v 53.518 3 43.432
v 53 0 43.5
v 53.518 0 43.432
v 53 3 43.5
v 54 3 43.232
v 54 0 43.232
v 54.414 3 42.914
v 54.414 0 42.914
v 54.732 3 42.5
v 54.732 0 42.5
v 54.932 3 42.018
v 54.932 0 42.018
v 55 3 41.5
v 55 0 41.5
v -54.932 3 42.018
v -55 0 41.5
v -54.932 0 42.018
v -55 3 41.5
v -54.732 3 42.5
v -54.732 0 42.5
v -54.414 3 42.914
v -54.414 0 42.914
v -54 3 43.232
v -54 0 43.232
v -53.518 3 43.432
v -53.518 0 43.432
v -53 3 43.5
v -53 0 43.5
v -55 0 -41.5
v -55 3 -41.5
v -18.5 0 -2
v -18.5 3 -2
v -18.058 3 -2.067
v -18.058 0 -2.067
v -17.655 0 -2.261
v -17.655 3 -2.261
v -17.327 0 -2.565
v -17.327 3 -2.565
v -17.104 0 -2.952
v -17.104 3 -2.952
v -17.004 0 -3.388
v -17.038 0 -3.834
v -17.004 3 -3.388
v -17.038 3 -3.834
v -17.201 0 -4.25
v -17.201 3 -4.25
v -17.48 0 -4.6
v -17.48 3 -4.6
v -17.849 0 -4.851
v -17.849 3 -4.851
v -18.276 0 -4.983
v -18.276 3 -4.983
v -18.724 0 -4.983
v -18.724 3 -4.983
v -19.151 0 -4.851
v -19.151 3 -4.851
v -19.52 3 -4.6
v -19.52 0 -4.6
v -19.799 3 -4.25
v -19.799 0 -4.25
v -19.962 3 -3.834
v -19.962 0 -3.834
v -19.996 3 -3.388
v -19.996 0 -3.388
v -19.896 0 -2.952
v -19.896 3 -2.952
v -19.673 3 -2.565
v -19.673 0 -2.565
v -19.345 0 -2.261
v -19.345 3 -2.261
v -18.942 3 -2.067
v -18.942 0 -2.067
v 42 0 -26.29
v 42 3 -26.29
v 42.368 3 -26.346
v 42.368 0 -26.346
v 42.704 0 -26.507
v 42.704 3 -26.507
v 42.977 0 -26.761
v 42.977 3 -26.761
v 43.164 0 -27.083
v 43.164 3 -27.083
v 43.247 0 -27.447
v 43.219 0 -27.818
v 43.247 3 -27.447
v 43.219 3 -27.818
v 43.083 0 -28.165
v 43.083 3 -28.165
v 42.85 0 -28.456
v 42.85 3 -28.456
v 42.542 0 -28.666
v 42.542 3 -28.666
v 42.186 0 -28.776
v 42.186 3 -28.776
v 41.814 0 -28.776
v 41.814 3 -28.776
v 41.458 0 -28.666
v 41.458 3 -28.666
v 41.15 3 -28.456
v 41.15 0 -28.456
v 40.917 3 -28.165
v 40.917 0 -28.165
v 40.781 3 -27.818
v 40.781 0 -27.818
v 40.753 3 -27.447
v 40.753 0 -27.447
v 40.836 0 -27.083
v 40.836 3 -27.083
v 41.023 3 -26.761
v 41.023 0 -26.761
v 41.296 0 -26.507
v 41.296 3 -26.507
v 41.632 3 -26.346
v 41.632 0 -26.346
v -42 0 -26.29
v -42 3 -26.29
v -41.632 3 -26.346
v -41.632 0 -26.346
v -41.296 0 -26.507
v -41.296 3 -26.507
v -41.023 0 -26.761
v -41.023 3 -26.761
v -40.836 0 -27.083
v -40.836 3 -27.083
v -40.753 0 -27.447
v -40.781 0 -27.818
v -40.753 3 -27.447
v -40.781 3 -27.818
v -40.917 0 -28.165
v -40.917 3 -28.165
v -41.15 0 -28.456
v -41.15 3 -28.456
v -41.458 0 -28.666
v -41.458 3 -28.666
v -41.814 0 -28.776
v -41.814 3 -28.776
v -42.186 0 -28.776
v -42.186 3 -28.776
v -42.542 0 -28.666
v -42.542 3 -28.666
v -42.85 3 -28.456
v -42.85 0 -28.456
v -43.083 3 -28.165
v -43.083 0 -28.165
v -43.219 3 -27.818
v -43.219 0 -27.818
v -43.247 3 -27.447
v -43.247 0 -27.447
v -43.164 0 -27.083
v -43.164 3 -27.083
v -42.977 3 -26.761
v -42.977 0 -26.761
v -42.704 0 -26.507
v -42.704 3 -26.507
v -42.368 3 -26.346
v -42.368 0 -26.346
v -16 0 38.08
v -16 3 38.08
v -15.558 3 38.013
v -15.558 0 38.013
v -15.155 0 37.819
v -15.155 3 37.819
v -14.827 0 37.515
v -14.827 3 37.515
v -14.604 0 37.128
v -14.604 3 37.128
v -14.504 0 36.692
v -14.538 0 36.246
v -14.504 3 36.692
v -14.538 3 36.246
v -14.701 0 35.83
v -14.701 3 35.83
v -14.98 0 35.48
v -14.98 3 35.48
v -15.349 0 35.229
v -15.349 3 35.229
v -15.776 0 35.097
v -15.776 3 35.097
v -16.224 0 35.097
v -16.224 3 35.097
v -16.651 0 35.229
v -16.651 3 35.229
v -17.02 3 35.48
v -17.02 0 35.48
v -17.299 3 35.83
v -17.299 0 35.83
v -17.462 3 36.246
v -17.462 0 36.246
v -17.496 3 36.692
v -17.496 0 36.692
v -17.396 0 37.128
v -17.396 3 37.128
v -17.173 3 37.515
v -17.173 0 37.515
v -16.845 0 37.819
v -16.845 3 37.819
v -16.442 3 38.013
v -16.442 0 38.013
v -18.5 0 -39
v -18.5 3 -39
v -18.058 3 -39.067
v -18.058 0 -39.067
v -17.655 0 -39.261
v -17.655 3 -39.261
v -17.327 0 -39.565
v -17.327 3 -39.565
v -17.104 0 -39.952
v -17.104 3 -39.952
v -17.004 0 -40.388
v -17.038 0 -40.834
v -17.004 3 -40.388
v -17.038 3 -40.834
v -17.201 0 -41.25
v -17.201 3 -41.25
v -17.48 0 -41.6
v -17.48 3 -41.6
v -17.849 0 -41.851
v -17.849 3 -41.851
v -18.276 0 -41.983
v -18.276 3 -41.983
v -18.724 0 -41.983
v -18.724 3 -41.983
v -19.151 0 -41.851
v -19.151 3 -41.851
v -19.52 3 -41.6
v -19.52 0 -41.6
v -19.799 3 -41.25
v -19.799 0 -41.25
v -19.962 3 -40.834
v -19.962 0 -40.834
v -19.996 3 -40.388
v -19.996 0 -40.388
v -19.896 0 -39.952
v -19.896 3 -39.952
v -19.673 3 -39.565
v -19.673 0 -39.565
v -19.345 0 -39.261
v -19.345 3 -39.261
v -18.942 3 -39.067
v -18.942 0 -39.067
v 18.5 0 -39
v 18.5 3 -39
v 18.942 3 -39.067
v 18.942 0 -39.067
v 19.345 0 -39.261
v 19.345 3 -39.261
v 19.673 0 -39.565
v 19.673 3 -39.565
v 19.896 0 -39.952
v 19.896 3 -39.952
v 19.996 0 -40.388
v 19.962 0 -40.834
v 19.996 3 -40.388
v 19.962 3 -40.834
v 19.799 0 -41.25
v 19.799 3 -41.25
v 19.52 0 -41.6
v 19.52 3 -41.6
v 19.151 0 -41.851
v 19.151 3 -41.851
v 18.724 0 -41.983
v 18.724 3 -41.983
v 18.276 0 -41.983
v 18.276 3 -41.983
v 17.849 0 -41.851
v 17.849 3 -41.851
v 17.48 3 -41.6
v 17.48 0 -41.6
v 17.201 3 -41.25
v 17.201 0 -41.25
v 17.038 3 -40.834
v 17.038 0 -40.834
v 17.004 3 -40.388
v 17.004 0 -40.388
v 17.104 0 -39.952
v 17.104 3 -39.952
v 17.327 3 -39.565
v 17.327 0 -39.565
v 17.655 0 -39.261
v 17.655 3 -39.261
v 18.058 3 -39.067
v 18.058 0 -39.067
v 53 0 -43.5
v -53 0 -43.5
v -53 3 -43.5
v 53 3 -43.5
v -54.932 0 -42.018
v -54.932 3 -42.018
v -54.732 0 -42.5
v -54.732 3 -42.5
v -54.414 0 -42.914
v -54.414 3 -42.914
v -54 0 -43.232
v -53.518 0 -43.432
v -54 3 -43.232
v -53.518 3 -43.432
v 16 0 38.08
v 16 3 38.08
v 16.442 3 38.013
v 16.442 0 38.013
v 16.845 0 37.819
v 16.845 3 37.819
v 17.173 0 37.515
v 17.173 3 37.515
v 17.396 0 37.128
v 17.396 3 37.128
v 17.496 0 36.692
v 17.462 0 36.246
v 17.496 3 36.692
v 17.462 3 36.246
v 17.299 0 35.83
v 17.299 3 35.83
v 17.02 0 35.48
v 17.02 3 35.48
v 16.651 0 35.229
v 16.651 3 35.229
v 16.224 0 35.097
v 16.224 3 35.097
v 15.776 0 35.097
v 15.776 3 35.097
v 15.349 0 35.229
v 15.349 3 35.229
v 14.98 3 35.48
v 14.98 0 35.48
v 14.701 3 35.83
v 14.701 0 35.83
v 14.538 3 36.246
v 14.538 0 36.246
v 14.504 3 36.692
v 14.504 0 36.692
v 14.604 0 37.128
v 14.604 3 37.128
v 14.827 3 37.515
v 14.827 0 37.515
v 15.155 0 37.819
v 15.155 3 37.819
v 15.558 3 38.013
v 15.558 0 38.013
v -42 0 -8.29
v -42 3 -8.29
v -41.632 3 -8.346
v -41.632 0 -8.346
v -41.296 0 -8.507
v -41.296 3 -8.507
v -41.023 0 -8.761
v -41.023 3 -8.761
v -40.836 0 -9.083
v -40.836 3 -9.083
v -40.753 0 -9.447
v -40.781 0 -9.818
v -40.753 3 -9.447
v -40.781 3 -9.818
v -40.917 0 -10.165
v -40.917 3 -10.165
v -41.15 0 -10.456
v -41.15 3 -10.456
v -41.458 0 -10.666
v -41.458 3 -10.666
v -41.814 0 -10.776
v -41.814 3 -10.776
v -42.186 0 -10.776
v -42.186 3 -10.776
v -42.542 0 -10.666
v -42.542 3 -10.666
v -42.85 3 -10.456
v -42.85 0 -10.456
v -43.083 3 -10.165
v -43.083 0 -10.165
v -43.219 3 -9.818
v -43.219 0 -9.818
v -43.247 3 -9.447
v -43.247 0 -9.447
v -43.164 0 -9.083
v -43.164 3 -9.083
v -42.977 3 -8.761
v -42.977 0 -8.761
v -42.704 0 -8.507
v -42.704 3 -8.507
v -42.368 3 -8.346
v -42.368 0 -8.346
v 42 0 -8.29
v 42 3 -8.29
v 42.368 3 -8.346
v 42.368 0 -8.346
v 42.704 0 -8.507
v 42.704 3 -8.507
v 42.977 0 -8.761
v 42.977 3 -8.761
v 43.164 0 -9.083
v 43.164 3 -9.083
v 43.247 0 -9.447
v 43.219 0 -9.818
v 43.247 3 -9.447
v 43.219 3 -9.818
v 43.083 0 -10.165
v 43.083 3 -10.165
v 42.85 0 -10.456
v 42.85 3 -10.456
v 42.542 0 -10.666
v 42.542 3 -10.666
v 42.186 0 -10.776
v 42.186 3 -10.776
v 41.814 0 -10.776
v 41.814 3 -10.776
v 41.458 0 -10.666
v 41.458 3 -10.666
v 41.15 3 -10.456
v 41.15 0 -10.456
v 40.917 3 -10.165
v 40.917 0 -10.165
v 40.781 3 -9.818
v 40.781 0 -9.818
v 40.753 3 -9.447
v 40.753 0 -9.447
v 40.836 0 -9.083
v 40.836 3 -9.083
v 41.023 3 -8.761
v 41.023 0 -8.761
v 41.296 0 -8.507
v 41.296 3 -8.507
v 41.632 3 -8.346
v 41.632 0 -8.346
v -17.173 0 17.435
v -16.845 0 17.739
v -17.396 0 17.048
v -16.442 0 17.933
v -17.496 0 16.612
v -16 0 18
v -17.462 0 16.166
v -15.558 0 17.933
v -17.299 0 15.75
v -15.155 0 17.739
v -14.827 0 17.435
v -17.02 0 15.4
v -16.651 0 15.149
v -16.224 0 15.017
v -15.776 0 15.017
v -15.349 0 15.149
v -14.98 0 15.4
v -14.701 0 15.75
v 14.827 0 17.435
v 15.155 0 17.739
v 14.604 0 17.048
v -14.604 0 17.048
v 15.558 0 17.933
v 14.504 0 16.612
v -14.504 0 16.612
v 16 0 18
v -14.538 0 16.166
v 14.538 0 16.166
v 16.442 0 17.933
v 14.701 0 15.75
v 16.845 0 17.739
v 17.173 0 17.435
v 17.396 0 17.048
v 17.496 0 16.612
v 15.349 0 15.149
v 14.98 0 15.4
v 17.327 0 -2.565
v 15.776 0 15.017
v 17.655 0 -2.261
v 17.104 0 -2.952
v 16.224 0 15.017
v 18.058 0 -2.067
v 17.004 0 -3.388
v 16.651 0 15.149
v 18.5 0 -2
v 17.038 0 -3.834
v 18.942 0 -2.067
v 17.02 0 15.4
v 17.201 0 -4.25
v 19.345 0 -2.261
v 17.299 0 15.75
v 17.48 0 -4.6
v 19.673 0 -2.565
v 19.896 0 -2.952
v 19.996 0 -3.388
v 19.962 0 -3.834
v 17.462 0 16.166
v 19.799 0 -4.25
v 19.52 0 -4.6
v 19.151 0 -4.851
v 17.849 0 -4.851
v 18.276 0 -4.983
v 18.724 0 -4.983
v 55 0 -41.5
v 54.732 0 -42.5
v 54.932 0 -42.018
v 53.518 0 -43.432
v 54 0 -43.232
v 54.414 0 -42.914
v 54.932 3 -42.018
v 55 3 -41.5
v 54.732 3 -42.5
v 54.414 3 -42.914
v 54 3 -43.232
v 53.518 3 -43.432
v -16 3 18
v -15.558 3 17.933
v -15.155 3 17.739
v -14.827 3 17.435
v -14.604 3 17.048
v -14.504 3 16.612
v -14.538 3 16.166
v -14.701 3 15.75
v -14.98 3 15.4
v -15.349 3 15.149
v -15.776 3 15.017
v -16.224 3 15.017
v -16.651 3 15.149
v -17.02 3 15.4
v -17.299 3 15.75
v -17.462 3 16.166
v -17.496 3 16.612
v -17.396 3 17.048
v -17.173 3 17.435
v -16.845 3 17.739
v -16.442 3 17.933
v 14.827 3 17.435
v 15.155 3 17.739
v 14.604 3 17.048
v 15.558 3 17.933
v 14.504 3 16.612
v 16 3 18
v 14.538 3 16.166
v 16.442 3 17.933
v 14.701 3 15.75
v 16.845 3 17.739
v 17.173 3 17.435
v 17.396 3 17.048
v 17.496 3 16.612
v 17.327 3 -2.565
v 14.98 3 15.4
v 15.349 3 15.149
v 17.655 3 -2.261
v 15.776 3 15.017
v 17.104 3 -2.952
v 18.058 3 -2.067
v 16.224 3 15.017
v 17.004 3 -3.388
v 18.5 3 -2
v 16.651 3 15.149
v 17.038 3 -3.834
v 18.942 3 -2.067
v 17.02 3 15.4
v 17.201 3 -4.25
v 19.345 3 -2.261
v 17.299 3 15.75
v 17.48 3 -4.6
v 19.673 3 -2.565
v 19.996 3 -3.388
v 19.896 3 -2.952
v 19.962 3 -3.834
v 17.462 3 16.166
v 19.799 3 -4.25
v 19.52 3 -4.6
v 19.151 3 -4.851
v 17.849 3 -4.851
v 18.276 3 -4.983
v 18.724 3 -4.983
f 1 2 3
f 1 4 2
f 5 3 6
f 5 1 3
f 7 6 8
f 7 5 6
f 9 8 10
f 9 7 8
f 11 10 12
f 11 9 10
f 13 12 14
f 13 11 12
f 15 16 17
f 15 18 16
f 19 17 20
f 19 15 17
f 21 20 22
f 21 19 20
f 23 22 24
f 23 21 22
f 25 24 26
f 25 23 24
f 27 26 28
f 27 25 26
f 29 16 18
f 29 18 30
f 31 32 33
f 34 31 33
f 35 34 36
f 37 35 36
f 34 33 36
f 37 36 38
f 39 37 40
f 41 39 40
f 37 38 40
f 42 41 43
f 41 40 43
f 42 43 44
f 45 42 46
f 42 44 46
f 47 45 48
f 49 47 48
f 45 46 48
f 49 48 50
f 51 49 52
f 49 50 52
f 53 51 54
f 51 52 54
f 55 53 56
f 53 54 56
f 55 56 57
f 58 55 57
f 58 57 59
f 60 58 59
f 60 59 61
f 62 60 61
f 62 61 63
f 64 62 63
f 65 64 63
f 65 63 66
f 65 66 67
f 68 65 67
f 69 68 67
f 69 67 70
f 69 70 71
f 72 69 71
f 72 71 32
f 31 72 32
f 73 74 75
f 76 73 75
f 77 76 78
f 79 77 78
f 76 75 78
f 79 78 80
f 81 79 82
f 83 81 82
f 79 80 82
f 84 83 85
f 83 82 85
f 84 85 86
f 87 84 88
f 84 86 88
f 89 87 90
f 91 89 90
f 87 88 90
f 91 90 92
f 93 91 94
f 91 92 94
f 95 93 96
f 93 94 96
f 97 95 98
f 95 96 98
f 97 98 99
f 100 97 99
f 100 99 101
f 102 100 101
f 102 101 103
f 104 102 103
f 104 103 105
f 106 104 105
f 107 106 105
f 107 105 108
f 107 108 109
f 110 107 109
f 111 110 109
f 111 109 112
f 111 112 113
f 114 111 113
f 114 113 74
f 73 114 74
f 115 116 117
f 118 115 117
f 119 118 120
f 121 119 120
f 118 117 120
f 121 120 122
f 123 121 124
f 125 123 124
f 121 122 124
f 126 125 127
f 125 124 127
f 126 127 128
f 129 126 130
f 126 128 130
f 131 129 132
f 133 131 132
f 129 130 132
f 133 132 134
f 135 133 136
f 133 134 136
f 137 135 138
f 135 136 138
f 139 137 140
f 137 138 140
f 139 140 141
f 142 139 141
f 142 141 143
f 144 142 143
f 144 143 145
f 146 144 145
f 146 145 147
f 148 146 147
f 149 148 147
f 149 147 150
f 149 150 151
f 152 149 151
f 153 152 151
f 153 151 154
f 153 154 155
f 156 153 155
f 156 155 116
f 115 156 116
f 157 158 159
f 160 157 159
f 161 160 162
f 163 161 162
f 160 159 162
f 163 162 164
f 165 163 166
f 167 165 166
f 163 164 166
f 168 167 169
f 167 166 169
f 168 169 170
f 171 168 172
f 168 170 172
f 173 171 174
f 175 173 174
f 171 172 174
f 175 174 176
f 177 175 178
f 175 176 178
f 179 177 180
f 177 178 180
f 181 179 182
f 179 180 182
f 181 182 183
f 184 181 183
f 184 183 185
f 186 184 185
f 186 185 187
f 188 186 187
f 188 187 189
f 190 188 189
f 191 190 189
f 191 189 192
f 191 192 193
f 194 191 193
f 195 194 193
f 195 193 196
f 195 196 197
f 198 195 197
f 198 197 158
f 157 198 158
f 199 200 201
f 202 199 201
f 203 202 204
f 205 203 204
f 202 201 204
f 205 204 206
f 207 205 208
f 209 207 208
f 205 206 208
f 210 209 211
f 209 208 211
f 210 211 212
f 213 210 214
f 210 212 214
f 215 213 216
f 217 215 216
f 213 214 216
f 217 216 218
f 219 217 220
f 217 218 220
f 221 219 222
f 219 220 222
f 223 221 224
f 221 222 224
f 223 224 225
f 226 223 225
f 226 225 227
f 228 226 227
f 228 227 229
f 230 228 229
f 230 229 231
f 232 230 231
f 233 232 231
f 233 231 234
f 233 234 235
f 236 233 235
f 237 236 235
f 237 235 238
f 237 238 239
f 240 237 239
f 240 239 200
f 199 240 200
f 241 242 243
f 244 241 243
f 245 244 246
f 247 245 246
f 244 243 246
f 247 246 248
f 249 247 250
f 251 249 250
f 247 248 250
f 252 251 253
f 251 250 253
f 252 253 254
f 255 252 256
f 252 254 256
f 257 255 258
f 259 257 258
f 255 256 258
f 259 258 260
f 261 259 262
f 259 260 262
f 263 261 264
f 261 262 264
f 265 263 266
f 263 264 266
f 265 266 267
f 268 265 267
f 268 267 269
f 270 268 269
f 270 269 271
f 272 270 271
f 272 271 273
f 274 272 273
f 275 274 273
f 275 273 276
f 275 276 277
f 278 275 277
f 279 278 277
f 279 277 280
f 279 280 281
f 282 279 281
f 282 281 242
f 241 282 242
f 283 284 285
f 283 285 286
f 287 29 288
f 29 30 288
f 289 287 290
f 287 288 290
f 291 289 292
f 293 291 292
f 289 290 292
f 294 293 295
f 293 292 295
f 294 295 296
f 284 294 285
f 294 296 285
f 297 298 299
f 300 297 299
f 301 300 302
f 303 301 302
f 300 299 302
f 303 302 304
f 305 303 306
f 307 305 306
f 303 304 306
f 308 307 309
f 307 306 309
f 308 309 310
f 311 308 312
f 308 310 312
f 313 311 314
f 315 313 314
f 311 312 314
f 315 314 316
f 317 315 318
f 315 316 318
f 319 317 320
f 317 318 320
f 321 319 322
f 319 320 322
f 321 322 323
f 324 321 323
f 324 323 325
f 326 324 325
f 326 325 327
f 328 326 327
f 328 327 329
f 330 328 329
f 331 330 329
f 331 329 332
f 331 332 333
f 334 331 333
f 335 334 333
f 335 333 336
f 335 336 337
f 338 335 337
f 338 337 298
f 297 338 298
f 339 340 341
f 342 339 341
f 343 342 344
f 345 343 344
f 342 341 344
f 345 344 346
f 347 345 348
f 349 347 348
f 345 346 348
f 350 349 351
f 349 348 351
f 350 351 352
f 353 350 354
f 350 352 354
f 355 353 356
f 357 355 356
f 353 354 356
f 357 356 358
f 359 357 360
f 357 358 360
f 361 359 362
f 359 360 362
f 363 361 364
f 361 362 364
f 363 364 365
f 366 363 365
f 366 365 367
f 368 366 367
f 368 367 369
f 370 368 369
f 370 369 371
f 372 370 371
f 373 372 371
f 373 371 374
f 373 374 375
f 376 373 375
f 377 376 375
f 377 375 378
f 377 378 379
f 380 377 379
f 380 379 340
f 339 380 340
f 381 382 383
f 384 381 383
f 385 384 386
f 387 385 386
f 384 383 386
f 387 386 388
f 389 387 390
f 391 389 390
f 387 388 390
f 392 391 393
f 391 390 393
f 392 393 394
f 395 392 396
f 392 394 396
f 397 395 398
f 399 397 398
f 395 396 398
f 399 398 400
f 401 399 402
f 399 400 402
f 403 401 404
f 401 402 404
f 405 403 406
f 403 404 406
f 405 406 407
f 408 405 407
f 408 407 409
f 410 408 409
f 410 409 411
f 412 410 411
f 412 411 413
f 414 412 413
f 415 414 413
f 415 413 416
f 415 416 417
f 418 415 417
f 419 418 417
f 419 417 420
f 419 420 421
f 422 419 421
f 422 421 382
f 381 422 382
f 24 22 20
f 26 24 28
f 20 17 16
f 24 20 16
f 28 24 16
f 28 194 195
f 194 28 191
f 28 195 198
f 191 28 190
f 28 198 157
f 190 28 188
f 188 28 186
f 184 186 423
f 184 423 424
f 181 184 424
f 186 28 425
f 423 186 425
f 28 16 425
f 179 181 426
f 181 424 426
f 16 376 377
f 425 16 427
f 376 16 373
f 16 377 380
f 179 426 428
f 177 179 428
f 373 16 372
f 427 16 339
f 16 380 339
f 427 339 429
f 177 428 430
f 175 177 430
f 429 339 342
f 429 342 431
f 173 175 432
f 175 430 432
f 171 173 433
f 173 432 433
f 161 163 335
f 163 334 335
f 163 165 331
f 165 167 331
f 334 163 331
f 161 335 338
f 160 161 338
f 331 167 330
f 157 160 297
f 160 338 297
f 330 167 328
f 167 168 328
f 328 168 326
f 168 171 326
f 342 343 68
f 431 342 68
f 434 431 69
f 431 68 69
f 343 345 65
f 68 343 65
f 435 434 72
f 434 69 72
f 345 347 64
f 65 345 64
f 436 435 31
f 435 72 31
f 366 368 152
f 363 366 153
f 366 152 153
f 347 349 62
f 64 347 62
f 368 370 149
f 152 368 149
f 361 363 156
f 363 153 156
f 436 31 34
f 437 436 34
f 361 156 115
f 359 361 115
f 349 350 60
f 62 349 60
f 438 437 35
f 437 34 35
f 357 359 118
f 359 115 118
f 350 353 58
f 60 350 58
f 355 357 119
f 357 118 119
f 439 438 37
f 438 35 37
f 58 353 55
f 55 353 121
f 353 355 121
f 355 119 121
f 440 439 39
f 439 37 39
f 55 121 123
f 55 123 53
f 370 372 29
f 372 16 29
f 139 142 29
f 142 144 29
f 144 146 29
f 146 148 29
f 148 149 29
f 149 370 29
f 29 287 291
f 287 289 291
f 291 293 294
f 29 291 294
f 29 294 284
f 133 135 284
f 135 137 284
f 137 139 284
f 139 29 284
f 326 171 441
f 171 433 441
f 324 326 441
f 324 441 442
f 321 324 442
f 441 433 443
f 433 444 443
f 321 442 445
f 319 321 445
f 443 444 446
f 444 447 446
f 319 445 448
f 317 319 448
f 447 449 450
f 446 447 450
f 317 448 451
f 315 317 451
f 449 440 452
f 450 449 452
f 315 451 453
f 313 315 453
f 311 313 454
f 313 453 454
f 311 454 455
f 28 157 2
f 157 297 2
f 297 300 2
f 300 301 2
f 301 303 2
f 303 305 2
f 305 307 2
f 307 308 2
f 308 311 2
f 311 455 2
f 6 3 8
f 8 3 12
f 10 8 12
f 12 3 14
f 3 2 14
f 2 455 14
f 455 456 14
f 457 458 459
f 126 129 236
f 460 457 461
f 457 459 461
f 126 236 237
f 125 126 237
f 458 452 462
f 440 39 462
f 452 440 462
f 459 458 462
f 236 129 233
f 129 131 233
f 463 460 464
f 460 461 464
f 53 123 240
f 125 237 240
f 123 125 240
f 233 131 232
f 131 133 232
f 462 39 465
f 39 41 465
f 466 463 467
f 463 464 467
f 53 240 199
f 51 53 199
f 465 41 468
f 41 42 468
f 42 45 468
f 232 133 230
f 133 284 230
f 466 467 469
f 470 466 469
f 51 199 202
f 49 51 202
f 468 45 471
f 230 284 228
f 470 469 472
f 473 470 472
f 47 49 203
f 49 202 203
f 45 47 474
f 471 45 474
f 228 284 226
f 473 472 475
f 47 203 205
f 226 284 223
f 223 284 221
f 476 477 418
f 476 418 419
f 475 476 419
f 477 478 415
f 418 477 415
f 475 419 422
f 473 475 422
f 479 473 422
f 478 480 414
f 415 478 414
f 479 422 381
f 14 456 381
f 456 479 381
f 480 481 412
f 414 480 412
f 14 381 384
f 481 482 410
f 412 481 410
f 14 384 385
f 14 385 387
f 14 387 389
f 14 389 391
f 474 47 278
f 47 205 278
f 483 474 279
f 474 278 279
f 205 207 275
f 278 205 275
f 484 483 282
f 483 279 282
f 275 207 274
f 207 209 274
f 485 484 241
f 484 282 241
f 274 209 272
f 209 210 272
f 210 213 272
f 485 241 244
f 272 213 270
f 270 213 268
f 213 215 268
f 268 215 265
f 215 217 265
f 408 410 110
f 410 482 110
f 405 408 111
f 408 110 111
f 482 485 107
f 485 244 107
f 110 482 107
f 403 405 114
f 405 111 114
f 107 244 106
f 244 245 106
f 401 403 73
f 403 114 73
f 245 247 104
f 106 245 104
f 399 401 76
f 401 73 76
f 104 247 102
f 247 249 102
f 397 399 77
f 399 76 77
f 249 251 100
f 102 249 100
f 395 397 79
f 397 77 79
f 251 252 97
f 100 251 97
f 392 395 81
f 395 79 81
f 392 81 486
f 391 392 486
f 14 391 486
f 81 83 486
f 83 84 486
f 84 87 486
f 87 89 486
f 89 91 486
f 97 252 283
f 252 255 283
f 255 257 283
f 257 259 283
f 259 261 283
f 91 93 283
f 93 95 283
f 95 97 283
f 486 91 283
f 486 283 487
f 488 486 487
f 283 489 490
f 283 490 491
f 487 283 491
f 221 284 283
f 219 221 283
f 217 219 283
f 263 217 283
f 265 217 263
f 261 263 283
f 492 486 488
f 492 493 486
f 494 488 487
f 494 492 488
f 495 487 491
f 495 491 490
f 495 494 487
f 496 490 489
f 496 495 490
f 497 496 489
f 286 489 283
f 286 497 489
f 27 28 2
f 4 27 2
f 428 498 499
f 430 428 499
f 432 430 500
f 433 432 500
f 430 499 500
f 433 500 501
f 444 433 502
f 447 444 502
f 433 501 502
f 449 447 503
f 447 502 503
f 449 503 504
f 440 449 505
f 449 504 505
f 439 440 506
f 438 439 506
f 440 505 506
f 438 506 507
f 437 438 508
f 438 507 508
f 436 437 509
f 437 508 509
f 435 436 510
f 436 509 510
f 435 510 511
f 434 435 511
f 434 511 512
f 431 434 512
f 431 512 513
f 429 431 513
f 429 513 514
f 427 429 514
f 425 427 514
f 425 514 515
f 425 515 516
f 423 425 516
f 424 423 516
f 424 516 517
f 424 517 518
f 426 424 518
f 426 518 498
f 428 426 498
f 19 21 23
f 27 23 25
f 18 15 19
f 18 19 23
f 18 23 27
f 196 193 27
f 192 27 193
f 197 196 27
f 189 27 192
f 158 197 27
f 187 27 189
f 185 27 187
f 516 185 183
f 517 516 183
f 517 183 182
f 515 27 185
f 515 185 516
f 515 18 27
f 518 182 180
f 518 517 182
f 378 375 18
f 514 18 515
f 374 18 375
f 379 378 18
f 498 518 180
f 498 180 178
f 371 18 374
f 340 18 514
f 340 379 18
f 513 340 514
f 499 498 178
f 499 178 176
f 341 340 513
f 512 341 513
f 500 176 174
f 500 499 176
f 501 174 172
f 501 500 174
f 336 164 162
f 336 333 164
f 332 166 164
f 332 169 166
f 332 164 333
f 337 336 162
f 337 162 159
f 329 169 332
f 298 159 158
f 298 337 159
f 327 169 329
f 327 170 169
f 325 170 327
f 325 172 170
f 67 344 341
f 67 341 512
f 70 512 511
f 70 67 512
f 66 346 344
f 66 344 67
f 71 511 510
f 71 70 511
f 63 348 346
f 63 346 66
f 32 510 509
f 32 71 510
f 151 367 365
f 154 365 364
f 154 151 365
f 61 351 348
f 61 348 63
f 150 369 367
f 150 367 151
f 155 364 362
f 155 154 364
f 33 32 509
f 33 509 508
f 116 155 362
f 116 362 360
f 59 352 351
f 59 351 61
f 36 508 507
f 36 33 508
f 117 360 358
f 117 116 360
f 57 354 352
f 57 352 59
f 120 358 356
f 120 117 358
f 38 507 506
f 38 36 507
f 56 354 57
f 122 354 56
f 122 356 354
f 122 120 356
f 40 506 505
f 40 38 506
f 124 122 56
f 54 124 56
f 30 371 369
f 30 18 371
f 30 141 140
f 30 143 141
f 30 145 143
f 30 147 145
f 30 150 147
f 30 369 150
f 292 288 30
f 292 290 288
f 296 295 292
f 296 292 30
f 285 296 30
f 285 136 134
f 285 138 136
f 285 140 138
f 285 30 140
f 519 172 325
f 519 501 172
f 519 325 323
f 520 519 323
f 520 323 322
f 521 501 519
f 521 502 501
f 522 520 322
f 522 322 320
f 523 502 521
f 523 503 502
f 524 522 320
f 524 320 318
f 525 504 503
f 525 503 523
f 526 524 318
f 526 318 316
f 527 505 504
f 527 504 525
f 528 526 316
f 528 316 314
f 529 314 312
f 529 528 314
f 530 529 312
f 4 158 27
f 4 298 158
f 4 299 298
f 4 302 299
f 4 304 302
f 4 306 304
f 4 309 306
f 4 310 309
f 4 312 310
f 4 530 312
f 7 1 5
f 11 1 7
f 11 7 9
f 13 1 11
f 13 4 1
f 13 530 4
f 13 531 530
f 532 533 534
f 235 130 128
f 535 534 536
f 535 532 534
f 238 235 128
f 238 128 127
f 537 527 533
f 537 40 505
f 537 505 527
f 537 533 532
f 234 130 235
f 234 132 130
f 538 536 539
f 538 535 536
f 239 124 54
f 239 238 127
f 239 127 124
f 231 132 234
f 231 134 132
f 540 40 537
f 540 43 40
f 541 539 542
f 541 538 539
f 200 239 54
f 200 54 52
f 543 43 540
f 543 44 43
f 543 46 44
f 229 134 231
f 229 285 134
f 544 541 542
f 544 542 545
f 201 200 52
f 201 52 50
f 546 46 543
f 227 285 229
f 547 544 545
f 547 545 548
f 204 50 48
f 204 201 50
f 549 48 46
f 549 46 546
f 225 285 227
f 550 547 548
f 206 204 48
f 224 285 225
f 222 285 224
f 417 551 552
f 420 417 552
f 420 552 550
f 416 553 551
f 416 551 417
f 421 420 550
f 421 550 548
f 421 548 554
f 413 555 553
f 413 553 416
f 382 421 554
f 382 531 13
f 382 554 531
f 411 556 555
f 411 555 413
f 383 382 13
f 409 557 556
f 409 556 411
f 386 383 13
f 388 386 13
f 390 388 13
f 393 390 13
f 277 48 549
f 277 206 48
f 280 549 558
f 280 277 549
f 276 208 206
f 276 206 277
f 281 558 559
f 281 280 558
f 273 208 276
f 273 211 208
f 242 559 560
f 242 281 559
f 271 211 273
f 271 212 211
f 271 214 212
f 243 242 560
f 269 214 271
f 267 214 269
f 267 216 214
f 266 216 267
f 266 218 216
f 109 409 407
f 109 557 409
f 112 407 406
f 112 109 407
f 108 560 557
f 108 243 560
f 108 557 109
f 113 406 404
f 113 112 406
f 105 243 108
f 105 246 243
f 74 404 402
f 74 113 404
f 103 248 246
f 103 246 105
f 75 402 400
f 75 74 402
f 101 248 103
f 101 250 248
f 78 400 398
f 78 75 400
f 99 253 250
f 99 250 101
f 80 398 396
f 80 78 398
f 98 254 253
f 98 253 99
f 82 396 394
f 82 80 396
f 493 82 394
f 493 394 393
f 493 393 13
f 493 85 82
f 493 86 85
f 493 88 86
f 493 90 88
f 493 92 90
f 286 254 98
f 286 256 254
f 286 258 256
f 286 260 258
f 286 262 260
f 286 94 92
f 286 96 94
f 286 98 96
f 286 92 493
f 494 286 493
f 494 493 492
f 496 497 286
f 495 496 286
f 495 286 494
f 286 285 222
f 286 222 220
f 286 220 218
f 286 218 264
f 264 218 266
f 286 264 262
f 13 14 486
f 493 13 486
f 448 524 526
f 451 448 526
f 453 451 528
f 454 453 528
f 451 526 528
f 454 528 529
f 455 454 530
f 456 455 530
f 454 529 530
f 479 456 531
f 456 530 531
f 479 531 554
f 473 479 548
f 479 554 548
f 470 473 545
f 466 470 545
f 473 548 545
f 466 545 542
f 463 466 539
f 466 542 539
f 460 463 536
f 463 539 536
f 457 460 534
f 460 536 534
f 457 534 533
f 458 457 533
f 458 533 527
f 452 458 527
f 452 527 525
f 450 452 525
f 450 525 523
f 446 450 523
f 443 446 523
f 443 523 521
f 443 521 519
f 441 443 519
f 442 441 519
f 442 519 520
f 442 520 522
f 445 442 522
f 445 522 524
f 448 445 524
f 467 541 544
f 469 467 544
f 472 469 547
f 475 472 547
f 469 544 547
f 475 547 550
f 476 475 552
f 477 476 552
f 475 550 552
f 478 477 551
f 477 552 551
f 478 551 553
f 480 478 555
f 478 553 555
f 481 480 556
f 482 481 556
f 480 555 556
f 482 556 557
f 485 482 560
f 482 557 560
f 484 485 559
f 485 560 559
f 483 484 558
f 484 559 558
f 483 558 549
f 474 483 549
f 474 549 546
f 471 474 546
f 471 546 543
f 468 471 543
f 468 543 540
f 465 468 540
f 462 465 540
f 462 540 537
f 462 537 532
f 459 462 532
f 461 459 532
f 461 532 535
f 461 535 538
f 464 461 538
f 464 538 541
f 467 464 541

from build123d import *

# Parameters (mm, degrees)
IZIM1_W                     = 110
IZIM1_H                     = 87
Y_KSEKLIK_EKSTR_ZYON1_DEPTH = 3
RADYUS1_R                   = 2
IZIM2_R                     = 1.5
IZIM2_R_2                   = 1.25
KES_EKSTR_ZYON1_DEPTH       = 10


with BuildPart() as part:
    # Çizim1 → Yükseklik-Ekstrüzyon1 (new body)
    with BuildSketch(Plane(origin=(0, 0, 0), x_dir=(1, 0, 0), z_dir=(0, 1, 0))):
        Rectangle(IZIM1_W, IZIM1_H)
    extrude(amount=Y_KSEKLIK_EKSTR_ZYON1_DEPTH)

    # Radyus1
    radyus1_edges = [part.edges().sort_by_distance(p)[0] for p in [
        (55, 1.5, 43.5),
        (-55, 1.5, 43.5),
        (-55, 1.5, -43.5),
        (55, 1.5, -43.5),
    ]]
    fillet(radyus1_edges, radius=RADYUS1_R)

    # Çizim2 → Kes-Ekstrüzyon1 (cut)
    with BuildSketch(Plane(origin=(0, 3, 0), x_dir=(1, 0, 0), z_dir=(0, 1, 0))):
        with Locations(Location((-18.5, 40.5, 0), (0, 0, 270))):
            Circle(IZIM2_R)
        with Locations(Location((18.5, 40.5, 0), (0, 0, 270))):
            Circle(IZIM2_R)
        with Locations(Location((18.5, 3.5, 0), (0, 0, 270))):
            Circle(IZIM2_R)
        with Locations(Location((-18.5, 3.5, 0), (0, 0, 270))):
            Circle(IZIM2_R)
        with Locations(Location((-42, 27.54, 0), (0, 0, 270))):
            Circle(IZIM2_R_2)
        with Locations(Location((-42, 9.54, 0), (0, 0, 270))):
            Circle(IZIM2_R_2)
        with Locations(Location((42, 27.54, 0), (0, 0, 270))):
            Circle(IZIM2_R_2)
        with Locations(Location((42, 9.54, 0), (0, 0, 270))):
            Circle(IZIM2_R_2)
        with Locations(Location((-16, -36.58, 0), (0, 0, 270))):
            Circle(IZIM2_R)
        with Locations(Location((-16, -16.5, 0), (0, 0, 270))):
            Circle(IZIM2_R)
        with Locations(Location((16, -16.5, 0), (0, 0, 270))):
            Circle(IZIM2_R)
        with Locations(Location((16, -36.58, 0), (0, 0, 270))):
            Circle(IZIM2_R)
    extrude(amount=-KES_EKSTR_ZYON1_DEPTH, mode=Mode.SUBTRACT)


solid = part.part
